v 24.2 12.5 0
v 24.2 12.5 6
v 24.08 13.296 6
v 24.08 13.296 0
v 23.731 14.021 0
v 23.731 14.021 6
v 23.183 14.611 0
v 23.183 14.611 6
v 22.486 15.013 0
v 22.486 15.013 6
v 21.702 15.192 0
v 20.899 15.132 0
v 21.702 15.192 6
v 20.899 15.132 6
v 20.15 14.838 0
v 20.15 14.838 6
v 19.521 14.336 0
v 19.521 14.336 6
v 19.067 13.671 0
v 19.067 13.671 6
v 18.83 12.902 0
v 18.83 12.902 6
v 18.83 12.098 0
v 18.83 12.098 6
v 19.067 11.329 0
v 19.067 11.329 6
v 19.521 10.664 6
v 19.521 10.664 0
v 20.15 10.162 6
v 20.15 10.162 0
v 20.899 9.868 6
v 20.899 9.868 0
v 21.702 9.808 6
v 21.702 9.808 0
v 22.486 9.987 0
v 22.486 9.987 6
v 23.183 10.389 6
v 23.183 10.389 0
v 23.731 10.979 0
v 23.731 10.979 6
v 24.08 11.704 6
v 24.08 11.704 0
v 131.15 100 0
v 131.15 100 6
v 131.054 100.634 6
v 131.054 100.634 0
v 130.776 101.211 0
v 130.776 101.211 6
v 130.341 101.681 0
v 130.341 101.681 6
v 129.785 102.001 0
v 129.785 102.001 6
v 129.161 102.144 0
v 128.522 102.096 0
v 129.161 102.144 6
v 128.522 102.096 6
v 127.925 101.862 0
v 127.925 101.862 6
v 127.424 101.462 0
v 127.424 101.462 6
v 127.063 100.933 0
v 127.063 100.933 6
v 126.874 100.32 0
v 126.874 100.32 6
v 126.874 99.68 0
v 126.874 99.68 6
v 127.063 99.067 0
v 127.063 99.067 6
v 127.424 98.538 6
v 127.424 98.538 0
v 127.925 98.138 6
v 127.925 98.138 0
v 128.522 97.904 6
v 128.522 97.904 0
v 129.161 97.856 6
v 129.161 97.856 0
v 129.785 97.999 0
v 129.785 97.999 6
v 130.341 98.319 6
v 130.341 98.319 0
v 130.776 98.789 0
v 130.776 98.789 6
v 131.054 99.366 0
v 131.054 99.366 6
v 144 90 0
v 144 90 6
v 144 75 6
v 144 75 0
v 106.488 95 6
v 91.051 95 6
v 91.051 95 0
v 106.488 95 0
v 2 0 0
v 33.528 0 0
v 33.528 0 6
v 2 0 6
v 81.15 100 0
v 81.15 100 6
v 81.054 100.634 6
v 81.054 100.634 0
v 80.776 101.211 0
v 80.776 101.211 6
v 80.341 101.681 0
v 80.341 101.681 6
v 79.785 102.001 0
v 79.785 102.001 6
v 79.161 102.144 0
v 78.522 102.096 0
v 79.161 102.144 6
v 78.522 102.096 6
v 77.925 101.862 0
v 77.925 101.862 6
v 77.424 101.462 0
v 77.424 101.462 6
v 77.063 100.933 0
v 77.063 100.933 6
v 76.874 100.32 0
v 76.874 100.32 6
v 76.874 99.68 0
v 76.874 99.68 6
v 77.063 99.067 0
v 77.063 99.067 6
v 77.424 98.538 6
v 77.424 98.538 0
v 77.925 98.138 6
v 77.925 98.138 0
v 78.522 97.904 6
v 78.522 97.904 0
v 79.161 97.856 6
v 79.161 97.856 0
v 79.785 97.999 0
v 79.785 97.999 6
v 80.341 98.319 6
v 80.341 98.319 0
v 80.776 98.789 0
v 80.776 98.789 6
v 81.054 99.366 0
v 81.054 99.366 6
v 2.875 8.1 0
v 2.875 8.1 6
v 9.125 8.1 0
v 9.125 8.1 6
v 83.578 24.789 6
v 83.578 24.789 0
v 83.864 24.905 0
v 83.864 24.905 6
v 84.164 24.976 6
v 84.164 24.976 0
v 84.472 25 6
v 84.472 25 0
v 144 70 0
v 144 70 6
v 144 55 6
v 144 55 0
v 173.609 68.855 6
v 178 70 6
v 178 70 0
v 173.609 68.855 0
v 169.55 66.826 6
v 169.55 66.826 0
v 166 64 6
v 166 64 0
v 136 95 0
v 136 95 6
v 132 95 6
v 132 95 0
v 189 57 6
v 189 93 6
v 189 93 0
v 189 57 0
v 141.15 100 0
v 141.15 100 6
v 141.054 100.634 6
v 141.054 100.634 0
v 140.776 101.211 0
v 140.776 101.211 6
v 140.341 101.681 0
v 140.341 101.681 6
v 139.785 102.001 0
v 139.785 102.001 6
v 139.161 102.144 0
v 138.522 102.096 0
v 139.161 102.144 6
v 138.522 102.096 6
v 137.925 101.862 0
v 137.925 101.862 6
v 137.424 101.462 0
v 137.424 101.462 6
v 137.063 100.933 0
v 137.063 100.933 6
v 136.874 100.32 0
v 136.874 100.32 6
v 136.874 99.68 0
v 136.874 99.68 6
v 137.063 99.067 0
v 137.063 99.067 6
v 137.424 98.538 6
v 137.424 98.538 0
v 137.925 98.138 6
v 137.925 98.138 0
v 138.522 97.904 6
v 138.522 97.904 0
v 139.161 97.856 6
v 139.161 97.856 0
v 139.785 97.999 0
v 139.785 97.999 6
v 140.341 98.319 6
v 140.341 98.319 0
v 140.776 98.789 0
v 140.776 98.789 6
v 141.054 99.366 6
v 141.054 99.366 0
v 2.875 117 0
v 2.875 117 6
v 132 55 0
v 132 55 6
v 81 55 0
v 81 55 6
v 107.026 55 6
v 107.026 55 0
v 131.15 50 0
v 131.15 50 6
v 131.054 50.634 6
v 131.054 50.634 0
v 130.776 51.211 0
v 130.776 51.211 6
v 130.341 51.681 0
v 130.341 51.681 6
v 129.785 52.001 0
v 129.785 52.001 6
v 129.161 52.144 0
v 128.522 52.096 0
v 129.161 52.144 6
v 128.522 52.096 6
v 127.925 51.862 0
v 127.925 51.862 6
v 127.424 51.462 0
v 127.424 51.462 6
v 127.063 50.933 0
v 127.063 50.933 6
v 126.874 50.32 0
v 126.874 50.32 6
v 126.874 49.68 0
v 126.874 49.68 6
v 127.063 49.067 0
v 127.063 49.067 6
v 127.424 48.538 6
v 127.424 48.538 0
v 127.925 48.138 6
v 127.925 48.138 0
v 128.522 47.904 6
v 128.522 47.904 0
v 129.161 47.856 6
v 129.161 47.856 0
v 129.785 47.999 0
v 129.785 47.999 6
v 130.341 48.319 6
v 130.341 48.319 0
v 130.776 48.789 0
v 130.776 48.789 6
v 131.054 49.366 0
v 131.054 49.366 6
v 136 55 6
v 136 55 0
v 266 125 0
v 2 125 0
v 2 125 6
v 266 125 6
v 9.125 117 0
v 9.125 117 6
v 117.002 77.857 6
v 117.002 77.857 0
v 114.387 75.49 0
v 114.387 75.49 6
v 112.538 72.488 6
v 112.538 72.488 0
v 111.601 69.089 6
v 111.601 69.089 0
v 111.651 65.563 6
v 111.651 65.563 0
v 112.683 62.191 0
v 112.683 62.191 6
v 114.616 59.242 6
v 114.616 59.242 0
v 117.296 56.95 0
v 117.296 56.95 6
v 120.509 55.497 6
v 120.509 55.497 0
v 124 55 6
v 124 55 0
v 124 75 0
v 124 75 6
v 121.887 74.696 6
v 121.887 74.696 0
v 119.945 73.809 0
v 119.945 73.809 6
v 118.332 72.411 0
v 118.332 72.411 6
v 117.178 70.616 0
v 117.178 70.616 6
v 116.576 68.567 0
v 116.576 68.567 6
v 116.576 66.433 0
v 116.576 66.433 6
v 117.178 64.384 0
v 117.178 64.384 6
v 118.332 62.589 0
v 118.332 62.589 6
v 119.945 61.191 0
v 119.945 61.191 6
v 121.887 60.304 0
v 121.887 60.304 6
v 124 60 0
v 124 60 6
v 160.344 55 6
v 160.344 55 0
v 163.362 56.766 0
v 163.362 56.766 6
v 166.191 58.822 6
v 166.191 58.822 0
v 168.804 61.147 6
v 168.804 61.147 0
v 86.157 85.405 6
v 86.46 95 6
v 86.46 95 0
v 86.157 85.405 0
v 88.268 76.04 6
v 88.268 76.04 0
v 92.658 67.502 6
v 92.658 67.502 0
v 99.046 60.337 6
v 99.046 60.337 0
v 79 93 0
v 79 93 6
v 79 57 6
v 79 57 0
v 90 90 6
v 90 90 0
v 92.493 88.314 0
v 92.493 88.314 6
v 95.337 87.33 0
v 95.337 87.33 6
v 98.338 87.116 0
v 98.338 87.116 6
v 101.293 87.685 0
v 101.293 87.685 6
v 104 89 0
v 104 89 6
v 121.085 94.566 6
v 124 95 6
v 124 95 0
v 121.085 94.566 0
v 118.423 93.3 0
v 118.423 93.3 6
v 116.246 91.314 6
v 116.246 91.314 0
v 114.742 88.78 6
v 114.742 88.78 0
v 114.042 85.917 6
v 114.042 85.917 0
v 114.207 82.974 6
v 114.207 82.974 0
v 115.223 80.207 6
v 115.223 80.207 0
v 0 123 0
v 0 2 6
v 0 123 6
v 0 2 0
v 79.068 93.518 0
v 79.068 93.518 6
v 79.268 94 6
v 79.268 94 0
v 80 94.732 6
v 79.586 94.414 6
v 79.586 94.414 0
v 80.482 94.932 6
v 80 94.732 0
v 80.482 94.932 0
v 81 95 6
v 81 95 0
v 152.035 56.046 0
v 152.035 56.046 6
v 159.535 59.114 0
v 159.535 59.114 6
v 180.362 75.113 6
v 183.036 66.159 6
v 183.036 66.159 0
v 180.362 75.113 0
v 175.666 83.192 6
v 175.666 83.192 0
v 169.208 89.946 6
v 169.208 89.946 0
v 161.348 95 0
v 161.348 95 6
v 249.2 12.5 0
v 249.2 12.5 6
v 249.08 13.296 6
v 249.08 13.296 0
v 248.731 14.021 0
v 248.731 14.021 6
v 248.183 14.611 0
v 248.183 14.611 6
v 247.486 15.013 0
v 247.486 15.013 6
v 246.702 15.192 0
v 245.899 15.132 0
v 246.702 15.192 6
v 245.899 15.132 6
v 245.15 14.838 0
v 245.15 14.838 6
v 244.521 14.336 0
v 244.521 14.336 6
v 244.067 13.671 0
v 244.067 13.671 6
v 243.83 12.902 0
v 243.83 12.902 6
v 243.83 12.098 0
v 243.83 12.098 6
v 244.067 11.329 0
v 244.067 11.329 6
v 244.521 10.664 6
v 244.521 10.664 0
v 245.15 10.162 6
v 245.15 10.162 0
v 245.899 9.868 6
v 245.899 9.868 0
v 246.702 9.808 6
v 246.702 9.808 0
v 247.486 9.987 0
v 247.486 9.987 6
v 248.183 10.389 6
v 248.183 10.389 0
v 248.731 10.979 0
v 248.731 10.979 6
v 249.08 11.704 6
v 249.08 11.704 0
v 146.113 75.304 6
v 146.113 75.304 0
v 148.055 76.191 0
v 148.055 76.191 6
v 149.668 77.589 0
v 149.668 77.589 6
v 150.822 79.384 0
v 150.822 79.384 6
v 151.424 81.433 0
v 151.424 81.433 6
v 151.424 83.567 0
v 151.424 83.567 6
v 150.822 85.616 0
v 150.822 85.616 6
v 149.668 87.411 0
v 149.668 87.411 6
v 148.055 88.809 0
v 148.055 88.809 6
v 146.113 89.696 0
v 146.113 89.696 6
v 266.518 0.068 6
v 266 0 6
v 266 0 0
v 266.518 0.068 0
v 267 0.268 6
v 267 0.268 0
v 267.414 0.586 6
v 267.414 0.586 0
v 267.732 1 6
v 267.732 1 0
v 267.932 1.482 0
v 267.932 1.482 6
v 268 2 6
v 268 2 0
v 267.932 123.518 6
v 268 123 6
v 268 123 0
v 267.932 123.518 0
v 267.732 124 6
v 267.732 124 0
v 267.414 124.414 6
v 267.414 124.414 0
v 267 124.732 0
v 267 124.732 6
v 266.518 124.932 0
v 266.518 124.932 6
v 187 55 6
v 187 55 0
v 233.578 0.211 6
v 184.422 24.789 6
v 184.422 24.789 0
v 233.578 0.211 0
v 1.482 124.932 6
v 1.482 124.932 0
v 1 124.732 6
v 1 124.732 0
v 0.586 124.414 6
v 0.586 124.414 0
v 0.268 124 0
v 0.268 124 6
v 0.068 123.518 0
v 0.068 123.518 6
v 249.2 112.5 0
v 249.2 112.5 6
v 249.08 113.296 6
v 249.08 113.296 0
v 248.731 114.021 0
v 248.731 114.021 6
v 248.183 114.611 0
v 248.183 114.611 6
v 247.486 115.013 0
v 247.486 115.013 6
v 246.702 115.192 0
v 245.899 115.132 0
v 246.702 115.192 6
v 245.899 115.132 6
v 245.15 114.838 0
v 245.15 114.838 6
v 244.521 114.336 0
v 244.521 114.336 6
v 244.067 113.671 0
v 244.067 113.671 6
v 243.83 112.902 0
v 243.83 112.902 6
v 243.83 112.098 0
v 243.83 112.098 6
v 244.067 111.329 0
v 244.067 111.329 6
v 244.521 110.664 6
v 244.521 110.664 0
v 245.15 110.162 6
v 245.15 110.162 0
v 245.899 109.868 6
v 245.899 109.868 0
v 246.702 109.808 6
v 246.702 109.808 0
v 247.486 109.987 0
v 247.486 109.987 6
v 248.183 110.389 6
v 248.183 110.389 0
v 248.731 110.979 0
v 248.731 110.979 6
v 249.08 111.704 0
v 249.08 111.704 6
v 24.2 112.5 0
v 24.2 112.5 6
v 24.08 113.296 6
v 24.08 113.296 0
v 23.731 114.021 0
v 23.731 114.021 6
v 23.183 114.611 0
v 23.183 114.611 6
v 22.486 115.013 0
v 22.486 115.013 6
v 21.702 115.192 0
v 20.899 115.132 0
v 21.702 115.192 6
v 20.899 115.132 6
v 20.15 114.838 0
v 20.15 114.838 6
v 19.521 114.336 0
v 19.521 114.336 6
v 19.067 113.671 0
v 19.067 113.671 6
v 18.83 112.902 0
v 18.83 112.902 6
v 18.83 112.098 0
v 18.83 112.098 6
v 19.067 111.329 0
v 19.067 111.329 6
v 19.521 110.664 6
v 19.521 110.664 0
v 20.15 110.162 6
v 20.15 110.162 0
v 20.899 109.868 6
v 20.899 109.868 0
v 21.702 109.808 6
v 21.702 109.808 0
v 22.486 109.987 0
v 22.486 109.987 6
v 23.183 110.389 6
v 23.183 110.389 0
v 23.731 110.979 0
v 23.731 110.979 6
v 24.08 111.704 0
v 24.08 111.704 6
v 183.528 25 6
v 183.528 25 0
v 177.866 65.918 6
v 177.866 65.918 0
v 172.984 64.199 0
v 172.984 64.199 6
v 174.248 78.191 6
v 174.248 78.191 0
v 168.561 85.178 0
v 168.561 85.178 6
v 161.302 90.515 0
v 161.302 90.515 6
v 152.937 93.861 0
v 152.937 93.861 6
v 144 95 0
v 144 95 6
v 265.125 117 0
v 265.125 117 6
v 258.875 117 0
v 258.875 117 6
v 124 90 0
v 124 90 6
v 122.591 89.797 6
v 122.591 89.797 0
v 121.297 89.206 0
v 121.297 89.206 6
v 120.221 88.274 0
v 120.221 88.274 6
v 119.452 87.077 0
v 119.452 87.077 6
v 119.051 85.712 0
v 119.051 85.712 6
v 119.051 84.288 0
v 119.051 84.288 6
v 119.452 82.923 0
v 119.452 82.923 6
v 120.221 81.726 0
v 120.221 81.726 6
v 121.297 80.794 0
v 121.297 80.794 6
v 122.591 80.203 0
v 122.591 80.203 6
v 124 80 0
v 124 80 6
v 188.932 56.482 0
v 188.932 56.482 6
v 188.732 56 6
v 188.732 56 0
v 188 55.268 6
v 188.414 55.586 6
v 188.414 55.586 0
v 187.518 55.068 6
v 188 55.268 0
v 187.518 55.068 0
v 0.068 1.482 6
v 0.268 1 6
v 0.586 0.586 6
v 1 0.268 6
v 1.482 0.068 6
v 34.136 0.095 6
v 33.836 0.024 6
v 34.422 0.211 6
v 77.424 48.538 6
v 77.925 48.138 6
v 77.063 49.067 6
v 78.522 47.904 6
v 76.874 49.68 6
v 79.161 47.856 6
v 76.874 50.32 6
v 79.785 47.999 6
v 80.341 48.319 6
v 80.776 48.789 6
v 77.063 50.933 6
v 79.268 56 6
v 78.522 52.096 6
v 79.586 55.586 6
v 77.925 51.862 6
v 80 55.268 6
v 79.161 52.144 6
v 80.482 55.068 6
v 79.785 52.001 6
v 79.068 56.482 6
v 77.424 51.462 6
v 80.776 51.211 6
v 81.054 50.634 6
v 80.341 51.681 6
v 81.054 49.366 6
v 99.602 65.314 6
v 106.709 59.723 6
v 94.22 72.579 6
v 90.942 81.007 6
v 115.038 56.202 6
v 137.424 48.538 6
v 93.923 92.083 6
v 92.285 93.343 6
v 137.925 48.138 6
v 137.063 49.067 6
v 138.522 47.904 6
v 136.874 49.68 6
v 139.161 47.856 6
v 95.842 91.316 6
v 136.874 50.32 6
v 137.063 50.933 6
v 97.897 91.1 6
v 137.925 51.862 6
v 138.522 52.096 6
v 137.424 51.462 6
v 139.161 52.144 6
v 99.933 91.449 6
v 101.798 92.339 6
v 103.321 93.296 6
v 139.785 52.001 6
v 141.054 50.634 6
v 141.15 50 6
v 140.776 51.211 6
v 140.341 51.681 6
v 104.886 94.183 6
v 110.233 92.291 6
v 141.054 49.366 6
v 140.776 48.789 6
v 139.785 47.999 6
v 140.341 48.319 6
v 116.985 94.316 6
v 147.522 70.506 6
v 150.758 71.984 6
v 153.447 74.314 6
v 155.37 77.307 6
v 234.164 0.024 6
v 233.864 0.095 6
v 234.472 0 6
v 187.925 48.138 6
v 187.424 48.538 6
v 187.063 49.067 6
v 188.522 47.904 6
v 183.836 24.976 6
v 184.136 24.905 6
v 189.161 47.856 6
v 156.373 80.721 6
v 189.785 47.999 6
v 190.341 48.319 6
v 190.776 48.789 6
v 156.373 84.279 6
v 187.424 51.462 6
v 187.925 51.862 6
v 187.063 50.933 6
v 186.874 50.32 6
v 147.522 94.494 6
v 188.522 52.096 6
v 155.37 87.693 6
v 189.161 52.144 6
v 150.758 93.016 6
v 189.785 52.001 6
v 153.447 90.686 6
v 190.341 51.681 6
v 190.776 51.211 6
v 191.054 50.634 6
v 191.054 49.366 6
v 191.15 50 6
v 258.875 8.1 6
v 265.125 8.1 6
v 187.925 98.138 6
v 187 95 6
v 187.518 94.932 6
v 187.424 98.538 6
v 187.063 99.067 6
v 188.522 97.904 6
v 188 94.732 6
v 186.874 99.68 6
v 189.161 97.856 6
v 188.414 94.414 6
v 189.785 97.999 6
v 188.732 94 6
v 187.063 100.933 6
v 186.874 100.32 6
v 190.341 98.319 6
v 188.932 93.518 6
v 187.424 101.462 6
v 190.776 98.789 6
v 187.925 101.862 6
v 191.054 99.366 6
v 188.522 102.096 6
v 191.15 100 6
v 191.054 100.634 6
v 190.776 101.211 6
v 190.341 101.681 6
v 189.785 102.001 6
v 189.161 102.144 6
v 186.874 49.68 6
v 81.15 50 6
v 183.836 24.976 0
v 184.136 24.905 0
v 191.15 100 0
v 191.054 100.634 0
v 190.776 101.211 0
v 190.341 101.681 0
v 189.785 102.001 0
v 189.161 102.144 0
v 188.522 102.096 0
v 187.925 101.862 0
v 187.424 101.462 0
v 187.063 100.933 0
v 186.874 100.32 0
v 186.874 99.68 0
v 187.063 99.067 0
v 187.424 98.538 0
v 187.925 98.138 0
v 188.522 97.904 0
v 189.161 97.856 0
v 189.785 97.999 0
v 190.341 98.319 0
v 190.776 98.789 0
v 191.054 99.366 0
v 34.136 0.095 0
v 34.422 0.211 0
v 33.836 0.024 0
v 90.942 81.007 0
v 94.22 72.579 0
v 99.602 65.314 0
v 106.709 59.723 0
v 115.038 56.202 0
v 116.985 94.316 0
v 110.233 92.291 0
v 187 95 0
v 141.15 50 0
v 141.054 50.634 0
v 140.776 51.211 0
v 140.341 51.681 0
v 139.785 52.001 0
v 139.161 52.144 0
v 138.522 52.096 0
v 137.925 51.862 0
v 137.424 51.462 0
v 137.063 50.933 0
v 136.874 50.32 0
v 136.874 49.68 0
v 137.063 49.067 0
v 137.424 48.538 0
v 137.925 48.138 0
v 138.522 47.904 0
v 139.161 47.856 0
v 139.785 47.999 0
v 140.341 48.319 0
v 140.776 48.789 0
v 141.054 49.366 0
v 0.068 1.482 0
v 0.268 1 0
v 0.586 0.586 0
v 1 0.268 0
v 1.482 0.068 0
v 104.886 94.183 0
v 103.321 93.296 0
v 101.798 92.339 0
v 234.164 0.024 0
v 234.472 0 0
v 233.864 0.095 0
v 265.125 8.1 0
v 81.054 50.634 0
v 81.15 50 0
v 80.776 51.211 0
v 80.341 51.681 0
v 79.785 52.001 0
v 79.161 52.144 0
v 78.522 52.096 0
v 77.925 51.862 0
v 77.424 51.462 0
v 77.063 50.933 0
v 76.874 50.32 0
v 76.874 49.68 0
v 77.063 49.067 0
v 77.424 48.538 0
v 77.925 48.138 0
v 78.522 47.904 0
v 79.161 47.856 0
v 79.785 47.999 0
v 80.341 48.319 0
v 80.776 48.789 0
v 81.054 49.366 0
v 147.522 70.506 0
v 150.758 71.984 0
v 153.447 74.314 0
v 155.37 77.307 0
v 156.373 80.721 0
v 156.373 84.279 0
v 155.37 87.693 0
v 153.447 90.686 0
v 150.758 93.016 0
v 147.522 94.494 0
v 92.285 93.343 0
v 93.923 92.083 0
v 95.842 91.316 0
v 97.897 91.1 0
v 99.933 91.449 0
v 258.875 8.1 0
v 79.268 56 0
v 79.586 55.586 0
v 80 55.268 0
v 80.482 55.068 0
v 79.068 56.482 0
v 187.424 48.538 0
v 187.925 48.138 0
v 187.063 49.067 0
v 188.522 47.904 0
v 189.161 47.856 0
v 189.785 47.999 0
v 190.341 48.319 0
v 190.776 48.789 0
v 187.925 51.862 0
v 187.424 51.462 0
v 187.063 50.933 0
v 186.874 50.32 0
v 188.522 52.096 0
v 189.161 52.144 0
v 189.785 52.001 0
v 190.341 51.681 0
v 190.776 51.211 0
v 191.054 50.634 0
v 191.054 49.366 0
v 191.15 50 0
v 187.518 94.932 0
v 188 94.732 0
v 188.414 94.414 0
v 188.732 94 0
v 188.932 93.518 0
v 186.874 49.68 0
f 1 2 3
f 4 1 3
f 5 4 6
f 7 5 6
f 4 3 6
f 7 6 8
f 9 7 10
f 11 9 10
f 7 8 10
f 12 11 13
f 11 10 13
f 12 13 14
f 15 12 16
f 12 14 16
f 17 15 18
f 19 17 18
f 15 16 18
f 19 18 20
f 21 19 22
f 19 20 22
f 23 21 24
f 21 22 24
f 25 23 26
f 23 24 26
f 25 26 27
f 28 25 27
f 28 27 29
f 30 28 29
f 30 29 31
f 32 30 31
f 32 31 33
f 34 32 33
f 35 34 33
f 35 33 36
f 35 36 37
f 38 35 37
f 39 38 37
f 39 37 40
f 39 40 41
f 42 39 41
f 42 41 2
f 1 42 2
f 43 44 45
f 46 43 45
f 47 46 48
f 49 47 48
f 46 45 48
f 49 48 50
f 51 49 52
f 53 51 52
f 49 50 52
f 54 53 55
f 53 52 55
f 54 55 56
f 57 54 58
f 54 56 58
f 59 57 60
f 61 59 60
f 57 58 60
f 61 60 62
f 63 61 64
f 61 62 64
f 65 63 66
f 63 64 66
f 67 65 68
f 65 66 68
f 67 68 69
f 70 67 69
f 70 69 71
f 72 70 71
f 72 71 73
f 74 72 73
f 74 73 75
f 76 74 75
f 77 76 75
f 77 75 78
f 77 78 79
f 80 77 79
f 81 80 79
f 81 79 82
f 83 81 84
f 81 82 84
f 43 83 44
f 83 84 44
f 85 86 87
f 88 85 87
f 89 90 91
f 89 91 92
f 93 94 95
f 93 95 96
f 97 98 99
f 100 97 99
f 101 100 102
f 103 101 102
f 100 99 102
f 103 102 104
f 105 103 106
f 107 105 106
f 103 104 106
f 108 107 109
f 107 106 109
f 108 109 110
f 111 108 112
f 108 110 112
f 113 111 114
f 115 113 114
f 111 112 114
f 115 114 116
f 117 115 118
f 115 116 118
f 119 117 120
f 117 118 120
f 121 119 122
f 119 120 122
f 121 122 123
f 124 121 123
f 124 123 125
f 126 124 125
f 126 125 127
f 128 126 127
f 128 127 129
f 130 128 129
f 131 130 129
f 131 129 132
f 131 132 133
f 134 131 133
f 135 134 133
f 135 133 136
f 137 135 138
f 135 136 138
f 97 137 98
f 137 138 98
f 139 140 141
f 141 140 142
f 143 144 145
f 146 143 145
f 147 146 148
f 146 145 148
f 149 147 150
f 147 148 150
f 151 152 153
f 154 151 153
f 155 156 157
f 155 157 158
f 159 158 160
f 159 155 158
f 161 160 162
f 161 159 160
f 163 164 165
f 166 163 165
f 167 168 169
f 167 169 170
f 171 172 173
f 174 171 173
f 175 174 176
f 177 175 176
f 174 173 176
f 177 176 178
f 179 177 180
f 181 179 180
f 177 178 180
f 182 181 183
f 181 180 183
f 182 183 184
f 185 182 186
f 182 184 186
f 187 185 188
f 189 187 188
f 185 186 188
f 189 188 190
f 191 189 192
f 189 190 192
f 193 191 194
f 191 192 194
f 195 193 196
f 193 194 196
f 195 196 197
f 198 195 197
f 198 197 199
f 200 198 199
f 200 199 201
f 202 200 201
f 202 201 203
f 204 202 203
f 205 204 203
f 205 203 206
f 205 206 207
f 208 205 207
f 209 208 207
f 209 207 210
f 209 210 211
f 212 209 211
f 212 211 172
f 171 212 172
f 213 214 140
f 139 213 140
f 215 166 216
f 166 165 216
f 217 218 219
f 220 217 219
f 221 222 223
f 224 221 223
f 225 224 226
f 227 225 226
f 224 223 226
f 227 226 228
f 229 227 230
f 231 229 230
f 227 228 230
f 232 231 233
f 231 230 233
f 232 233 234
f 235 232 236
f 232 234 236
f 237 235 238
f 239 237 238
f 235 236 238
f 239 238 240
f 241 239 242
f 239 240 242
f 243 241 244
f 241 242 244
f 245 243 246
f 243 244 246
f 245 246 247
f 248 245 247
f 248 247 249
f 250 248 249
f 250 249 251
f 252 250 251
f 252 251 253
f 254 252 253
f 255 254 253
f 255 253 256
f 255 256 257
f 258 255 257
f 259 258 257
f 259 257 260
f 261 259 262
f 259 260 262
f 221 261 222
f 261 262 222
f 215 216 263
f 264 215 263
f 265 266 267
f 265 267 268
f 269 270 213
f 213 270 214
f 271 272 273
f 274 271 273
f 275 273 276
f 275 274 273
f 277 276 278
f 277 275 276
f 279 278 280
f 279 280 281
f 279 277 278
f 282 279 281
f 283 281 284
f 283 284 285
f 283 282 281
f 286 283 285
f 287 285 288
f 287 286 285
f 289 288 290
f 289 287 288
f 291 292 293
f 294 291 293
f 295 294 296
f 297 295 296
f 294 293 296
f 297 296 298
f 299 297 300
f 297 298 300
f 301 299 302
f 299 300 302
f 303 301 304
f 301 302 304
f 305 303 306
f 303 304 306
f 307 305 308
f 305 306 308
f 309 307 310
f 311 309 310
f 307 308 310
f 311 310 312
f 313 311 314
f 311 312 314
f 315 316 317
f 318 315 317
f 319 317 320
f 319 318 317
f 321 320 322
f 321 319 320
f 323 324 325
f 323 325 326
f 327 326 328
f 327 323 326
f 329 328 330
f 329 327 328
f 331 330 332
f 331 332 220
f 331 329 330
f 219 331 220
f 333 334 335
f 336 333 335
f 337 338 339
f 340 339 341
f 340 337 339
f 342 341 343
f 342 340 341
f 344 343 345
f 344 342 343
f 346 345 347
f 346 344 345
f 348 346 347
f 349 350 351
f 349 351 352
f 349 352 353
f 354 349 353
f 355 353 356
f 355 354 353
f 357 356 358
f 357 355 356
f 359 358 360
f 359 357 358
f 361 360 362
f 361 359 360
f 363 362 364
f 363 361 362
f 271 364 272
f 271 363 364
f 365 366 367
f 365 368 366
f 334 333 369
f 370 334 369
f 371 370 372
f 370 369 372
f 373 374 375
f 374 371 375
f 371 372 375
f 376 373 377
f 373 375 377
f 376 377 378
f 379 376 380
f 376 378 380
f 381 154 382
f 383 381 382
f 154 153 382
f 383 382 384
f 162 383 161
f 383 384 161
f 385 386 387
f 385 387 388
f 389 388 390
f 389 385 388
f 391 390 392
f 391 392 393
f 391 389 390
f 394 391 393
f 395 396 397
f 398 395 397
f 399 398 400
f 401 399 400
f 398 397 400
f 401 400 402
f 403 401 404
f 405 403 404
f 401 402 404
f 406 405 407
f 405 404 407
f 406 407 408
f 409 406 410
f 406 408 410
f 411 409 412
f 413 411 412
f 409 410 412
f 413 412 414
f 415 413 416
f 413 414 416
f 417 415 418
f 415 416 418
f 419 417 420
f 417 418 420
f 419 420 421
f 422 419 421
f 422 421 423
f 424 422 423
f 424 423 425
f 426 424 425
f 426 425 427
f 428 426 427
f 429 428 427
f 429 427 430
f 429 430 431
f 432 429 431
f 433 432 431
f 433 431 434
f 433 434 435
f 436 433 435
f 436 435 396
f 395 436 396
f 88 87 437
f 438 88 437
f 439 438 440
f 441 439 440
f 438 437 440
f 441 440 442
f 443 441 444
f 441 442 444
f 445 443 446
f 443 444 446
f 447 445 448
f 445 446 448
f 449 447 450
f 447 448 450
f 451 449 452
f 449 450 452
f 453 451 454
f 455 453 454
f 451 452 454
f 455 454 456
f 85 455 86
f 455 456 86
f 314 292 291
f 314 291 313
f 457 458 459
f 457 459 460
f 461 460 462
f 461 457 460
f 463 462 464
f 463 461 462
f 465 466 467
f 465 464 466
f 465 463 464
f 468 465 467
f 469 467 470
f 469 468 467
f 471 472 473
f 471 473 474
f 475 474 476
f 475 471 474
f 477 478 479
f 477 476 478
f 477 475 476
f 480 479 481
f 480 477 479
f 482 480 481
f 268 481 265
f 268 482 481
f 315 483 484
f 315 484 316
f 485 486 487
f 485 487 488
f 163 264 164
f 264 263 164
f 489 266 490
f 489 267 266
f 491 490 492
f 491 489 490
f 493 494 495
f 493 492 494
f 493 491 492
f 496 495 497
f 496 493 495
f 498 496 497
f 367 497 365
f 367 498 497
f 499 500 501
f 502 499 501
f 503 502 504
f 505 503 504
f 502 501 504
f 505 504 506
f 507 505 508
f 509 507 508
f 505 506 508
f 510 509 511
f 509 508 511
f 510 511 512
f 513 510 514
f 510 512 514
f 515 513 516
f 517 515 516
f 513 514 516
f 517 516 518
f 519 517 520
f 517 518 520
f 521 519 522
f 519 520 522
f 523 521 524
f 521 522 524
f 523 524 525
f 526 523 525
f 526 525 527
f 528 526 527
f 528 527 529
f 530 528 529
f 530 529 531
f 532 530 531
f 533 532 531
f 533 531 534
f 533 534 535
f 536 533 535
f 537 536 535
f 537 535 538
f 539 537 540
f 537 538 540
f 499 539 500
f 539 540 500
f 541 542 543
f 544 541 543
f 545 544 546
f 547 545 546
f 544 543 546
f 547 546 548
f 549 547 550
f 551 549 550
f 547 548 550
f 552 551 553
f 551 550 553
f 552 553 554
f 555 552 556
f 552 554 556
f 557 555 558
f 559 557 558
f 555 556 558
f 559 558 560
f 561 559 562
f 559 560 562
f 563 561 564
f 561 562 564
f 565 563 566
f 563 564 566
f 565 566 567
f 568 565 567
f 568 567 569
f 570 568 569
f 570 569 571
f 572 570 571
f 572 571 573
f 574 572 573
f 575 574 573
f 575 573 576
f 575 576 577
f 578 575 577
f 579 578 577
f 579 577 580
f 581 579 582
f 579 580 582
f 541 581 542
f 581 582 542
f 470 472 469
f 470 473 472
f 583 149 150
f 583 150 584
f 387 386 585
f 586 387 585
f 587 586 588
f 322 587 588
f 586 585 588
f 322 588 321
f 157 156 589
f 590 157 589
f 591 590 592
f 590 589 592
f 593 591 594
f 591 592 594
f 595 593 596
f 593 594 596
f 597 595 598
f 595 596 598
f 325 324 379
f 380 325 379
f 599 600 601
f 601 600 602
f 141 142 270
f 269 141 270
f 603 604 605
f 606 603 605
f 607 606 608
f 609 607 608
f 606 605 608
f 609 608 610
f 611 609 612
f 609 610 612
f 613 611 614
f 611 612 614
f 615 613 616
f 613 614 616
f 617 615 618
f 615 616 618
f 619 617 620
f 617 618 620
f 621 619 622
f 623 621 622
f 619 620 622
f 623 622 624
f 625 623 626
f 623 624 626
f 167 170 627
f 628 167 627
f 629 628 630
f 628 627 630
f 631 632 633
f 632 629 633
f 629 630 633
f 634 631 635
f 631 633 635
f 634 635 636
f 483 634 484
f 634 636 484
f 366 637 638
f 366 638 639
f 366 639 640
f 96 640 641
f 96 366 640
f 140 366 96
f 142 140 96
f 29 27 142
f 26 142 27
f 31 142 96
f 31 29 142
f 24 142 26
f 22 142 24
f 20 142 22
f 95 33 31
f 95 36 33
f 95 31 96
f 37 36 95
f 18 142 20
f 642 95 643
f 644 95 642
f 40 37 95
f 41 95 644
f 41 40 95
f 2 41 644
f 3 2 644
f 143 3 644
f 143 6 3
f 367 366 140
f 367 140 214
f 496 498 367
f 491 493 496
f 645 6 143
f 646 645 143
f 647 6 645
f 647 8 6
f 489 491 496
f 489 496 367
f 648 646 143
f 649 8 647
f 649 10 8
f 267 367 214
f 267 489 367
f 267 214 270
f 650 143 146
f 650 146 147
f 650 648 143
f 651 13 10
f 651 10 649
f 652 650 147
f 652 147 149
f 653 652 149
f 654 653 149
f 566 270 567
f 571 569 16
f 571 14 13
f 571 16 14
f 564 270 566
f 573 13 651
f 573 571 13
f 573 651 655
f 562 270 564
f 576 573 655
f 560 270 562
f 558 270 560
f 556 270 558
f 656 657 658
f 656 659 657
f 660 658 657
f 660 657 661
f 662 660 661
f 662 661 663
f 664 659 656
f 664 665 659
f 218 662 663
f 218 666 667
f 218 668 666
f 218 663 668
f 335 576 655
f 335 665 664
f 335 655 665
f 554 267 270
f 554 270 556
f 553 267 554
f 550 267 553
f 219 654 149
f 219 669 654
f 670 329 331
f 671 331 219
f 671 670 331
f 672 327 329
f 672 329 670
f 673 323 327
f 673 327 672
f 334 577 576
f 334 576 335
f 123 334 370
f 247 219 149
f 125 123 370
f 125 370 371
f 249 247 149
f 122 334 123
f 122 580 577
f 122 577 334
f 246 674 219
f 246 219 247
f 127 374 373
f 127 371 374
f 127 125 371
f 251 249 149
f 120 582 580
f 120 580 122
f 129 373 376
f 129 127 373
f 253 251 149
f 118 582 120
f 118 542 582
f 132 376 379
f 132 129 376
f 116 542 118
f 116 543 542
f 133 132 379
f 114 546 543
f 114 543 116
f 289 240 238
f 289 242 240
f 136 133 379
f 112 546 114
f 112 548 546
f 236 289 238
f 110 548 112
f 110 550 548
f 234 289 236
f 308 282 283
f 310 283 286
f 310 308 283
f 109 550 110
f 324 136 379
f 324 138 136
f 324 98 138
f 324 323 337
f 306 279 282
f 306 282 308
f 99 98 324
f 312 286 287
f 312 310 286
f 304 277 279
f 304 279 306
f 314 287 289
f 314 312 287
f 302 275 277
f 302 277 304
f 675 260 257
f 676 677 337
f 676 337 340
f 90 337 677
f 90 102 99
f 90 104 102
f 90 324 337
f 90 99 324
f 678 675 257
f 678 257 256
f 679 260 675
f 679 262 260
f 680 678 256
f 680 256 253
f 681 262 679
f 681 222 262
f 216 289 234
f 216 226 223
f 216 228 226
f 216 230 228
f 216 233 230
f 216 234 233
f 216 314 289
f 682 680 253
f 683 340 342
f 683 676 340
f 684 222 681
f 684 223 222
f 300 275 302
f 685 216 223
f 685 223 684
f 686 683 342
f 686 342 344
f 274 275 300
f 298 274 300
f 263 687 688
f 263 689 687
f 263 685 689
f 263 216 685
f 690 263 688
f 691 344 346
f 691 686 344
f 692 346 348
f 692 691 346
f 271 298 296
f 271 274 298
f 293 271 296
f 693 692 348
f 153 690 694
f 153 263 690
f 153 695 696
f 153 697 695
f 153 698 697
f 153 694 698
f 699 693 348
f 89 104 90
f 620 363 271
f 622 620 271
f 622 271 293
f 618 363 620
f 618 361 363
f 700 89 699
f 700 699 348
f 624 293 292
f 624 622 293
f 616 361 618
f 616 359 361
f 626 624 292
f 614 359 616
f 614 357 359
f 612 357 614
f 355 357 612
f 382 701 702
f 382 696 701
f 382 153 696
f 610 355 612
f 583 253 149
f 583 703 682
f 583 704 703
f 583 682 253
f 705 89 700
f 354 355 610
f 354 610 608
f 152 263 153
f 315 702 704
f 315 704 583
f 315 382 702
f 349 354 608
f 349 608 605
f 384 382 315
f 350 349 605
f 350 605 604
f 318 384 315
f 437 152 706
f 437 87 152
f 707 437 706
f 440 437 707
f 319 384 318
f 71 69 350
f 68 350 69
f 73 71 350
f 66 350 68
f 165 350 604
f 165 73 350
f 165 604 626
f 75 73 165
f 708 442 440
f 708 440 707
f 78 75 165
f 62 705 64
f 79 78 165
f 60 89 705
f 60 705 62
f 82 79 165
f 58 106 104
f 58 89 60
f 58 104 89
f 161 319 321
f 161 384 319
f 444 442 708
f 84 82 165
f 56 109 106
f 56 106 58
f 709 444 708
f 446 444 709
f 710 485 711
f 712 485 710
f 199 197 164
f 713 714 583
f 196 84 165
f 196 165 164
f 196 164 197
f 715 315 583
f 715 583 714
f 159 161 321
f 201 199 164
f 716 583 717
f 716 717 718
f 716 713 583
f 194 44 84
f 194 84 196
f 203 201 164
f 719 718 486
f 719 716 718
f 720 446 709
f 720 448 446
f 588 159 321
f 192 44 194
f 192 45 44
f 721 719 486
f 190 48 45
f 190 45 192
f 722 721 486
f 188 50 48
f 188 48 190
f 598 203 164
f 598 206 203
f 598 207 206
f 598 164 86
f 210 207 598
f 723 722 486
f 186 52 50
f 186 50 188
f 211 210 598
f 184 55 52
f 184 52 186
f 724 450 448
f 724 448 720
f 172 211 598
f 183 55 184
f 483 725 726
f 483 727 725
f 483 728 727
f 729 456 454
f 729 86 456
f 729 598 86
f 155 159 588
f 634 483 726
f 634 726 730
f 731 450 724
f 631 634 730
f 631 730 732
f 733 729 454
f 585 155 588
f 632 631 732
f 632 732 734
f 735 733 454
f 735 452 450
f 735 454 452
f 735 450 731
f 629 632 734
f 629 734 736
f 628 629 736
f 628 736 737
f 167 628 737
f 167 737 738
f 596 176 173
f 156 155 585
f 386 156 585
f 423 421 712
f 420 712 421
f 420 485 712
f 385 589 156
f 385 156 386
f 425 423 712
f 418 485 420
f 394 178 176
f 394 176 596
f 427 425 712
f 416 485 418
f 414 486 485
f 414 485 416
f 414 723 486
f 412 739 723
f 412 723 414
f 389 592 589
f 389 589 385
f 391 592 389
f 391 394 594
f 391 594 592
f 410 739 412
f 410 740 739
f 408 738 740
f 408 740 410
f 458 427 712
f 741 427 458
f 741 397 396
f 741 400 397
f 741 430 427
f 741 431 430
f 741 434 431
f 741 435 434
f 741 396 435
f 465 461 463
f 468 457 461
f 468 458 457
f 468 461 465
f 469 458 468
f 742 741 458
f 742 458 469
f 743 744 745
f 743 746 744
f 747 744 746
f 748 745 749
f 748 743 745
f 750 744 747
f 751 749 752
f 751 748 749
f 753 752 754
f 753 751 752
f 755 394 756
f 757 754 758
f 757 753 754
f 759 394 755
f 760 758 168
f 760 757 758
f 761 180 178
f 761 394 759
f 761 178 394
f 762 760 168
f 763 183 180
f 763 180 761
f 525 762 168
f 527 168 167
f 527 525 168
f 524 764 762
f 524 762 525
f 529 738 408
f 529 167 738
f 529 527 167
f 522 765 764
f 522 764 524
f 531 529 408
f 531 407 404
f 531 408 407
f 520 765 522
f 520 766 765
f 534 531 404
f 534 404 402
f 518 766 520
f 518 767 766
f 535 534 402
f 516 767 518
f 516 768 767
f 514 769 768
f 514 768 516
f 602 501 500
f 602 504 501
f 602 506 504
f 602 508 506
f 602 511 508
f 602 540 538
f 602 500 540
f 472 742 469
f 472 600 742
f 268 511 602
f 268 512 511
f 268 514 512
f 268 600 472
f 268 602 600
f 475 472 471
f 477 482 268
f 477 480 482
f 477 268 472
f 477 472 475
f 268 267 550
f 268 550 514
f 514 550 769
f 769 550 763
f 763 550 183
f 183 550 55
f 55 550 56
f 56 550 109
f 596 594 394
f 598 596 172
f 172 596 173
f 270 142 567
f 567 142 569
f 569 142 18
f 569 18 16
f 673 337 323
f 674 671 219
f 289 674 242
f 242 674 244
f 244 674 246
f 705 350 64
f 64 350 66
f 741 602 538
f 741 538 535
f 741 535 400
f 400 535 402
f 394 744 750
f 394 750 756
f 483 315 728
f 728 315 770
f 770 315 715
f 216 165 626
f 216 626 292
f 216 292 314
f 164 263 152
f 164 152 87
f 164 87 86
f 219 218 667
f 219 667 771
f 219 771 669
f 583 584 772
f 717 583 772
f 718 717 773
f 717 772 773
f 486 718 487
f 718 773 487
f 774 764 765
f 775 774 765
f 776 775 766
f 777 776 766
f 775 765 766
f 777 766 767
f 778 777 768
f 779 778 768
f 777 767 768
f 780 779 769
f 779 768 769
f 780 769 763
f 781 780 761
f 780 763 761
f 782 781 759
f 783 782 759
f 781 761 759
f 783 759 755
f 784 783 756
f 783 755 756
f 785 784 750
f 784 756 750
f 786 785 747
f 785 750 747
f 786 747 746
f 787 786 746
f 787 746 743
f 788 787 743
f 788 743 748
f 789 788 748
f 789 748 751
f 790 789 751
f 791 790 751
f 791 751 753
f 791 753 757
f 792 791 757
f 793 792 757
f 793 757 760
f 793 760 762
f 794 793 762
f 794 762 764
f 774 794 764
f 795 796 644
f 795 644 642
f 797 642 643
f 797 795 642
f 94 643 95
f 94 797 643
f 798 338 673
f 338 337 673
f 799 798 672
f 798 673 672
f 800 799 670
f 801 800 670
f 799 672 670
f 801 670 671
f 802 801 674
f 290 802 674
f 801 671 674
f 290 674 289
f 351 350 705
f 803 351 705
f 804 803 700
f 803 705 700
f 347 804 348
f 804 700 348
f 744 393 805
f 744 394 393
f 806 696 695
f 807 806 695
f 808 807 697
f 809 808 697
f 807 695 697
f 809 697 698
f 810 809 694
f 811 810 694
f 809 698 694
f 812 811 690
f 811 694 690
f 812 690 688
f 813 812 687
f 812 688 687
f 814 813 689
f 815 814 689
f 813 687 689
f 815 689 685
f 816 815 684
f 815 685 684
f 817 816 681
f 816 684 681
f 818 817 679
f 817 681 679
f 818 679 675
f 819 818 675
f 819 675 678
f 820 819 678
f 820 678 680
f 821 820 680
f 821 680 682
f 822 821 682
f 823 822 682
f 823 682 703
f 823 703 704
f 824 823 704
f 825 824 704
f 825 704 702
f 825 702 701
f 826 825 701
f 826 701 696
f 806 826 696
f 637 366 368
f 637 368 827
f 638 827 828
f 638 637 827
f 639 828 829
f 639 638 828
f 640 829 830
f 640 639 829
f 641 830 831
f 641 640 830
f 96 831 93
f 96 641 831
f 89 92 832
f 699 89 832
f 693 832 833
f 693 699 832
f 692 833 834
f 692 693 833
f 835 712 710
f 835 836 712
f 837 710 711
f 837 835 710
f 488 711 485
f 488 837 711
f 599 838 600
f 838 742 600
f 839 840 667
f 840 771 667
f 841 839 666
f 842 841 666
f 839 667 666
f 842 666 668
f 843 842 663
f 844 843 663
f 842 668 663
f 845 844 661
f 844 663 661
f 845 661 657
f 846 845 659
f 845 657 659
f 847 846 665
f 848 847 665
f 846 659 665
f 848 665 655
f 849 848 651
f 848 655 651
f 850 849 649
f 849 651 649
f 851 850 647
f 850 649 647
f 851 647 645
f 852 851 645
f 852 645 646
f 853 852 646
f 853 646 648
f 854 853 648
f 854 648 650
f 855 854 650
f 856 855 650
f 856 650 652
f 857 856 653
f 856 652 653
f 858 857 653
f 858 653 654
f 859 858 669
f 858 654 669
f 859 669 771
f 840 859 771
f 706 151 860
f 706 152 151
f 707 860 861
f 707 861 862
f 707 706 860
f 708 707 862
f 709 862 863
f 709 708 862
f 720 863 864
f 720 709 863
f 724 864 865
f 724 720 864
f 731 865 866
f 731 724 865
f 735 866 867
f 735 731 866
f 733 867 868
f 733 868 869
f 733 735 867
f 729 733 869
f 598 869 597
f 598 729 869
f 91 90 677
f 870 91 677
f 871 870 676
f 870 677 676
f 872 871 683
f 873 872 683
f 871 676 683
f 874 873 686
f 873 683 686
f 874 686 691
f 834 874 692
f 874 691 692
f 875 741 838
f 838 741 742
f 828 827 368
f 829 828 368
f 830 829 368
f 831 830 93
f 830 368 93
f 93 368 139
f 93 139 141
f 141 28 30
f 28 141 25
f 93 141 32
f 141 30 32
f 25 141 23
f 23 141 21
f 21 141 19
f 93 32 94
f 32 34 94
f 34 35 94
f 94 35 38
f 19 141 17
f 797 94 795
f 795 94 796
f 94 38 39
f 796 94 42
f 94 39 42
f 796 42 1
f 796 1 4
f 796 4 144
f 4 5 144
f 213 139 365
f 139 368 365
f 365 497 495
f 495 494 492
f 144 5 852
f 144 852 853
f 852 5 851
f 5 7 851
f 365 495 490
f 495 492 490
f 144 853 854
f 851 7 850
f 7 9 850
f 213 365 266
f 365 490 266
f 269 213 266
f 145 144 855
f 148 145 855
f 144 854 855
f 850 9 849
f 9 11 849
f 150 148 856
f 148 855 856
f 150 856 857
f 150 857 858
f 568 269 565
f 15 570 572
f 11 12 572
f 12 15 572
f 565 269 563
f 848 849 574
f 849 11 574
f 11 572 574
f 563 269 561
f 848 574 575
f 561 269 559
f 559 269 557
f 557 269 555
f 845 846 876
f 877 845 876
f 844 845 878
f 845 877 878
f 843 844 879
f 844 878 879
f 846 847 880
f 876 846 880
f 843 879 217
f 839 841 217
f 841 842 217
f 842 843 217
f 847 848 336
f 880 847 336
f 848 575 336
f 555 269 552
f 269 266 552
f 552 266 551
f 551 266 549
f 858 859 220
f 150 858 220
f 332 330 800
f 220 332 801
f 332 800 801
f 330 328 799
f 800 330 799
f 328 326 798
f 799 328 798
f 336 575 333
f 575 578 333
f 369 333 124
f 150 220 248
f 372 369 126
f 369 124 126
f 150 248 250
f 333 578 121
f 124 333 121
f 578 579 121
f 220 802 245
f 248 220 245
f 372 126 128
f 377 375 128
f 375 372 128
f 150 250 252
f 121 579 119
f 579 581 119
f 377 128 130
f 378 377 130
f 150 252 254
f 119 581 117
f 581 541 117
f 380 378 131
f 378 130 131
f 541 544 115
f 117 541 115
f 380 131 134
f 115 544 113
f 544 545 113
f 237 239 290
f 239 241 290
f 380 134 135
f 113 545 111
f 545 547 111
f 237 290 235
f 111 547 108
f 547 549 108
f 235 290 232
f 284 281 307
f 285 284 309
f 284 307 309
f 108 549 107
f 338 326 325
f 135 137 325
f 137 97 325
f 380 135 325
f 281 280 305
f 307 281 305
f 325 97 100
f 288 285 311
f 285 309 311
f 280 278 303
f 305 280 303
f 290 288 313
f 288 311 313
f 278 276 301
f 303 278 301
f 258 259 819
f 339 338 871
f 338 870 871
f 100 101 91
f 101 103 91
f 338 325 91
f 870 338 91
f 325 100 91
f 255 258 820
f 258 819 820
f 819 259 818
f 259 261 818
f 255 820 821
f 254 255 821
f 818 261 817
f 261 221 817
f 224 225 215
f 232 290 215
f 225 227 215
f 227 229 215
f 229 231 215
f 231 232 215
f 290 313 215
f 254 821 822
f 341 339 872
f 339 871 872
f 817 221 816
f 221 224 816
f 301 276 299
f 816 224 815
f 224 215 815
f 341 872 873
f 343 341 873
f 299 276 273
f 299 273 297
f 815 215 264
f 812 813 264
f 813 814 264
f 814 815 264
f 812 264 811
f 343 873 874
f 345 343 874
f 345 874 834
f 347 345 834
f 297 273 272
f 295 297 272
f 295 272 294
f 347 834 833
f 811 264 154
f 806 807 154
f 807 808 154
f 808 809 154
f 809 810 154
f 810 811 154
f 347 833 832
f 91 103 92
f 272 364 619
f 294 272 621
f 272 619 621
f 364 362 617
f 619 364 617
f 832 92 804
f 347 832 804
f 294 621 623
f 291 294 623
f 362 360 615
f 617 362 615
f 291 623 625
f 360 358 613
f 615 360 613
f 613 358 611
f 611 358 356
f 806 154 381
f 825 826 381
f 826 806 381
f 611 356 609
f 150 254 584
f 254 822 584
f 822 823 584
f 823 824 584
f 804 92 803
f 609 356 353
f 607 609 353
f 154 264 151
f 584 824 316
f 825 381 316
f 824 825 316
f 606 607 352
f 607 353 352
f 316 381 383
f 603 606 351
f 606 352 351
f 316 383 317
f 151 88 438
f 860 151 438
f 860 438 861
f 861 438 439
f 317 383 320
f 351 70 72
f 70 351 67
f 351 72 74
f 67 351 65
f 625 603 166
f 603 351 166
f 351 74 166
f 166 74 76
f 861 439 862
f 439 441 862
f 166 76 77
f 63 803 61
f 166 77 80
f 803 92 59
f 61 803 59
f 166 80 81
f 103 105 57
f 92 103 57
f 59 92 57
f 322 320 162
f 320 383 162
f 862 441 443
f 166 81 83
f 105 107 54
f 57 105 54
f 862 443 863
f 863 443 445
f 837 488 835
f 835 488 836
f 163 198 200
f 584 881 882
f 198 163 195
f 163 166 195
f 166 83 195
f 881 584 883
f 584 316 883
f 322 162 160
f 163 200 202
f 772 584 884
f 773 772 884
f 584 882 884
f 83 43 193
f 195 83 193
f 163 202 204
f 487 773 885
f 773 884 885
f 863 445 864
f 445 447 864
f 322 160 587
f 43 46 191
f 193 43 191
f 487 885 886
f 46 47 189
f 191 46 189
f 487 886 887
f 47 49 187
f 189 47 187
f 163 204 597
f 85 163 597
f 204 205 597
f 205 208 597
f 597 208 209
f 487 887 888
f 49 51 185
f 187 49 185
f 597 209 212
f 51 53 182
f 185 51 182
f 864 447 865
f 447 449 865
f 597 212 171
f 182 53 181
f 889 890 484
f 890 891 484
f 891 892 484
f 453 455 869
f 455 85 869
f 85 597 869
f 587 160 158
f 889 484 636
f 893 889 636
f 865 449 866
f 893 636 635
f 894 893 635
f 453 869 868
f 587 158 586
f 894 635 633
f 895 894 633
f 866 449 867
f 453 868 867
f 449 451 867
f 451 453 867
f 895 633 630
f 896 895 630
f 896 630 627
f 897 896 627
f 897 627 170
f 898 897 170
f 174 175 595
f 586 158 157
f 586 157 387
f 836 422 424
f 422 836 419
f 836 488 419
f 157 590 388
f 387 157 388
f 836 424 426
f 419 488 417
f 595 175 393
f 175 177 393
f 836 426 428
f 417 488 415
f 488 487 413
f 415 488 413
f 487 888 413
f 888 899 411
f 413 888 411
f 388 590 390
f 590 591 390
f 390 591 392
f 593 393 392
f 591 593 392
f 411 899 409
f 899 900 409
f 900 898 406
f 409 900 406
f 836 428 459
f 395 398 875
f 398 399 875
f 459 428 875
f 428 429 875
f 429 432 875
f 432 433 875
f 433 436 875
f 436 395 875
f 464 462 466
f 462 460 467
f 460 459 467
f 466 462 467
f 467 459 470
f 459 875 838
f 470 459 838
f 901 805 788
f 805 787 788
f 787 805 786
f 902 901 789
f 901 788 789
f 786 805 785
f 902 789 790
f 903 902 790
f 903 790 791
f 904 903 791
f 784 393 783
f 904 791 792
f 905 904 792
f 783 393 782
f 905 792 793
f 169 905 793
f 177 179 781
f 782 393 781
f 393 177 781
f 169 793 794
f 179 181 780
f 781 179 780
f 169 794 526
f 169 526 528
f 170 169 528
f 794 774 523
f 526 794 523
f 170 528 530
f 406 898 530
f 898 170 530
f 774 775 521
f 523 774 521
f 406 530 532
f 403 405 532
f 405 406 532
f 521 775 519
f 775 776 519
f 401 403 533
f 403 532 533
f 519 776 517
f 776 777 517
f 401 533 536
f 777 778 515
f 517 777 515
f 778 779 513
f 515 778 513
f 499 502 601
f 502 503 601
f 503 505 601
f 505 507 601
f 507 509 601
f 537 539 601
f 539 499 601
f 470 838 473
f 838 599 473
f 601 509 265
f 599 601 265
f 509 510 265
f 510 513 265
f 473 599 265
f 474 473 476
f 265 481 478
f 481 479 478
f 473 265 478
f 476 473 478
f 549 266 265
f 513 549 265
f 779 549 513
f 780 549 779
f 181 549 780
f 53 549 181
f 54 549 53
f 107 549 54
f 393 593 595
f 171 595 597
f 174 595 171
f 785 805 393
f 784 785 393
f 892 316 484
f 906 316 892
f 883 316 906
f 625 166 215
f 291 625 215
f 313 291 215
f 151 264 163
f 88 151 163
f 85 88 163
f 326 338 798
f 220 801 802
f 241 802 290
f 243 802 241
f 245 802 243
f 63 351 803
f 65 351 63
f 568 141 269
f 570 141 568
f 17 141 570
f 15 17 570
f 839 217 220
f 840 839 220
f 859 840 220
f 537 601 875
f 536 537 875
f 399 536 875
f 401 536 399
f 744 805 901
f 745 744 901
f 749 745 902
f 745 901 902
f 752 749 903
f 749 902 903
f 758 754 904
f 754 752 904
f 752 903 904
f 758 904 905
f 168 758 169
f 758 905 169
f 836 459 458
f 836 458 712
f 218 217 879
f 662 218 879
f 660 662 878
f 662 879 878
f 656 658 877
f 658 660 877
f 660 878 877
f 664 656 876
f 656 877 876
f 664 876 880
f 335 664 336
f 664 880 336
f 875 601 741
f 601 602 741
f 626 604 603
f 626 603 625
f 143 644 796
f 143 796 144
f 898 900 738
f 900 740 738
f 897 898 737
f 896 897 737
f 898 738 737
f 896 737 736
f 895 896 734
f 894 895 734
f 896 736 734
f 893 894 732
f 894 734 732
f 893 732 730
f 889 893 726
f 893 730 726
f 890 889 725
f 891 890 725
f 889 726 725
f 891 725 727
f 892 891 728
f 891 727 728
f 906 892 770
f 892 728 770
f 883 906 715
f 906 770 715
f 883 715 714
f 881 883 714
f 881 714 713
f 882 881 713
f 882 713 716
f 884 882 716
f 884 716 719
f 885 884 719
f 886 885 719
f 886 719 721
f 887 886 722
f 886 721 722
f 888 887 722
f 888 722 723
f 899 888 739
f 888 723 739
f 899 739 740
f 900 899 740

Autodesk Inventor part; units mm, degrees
ref_plane "YZ Plane" through (0, 0, 0) normal (1, 0, 0) x (0, 1, 0)
ref_plane "XZ Plane" through (0, 0, 0) normal (0, 1, 0) x (-1, 0, 0)
ref_plane "XY Plane" through (0, 0, 0) normal (0, 0, 1) x (1, 0, 0)
sketch "Sketch1" plane through (0, 0, 0) normal (0, 0, 1) x (1, 0, 0)
  line L0 (0, 0) -> (0, 125)
  line L1 (0, 125) -> (268, 125)
  line L2 (268, 125) -> (268, 0)
  line L3 (268, 0) -> (0, 0)
  point P0 (134, 125)
  dimension "d1" = 125
  dimension "d2" = 268
extrude "Extrusion1" add sketch "Sketch1" along normal blind 6
sketch "Sketch2" plane through (0, 0, 6) normal (0, 0, 1) x (1, 0, 0)
  line L0 (0, 0) -> (268, 0) projected
  line L1 (268, 0) -> (268, 125) projected
  line L2 (34, 0) -> (84, 25)
  line L3 (84, 25) -> (184, 25)
  line L4 (184, 25) -> (234, 0)
  line L5 (234, 0) -> (34, 0)
  line L6 (0, 125) -> (0, 0) projected
  dimension "d6" = 25
  dimension "d7" = 34
  dimension "d9" = 50
  dimension "d47" = 34
extrude "Extrusion2" cut sketch "Sketch2" against normal through all
sketch "Sketch7" plane through (0, 0, 6) normal (0, 0, 1) x (1, 0, 0)
  line L0 (268, 0) -> (268, 125) projected
  line L1 (268, 125) -> (0, 125) projected
  line L2 (0, 125) -> (0, 0) projected
  line L3 (0, 0) -> (34, 0) projected
  circle A0 centre (246.5, 12.5) radius 2.7
  circle A1 centre (246.5, 112.5) radius 2.7
  circle A2 centre (21.5, 12.5) radius 2.7
  circle A3 centre (21.5, 112.5) radius 2.7
  line L4 (2.875, 8.1) -> (9.125, 8.1)
  line L5 (9.125, 8.1) -> (9.125, 117)
  line L6 (9.125, 117) -> (2.875, 117)
  line L7 (2.875, 117) -> (2.875, 8.1)
  line L8 (2.875, 8.1) -> (9.125, 117) construction
  line L9 (9.125, 8.1) -> (2.875, 117) construction
  line L10 (258.875, 8.1) -> (265.125, 8.1)
  line L11 (265.125, 8.1) -> (265.125, 117)
  line L12 (265.125, 117) -> (258.875, 117)
  line L13 (258.875, 117) -> (258.875, 8.1)
  line L14 (258.875, 8.1) -> (265.125, 117) construction
  line L15 (265.125, 8.1) -> (258.875, 117) construction
  point P0 (6, 62.55)
  point P1 (262, 62.55)
  point P2 (6, 62.55)
  point P3 (262, 62.55)
  dimension "d48" = 21.5
  dimension "d49" = 21.5
  dimension "d50" = 12.5
  dimension "d51" = 12.5
  dimension "d56" = 2.875
  dimension "d57" = 6.25
  dimension "d58" = 2.875
  dimension "d60" = 8
  dimension "d61" = 5.4
  dimension "d62" = 108.9
  dimension "d66" = 8.1
extrude "Extrusion5" cut sketch "Sketch7" against normal through all
fillet "Fillet1" radius 2 8 edges at (268, 125, 3) (268, 0, 3) (234, 0, 3) (184, 25, 3) (84, 25, 3) (34, 0, 3) (0, 0, 3) (0, 125, 3)
sketch "Sketch8" plane through (0, 0, 6) normal (0, 0, 1) x (1, 0, 0)
  line L0 (9.125, 8.1) -> (2.875, 8.1) projected
  line L1 (84.4721, 25) -> (183.5279, 25) projected
  line L2 (266, 125) -> (2, 125) projected
  line L3 (79, 50) -> (129, 50) construction
  line L4 (129, 50) -> (129, 100) construction
  line L5 (129, 100) -> (79, 100) construction
  line L6 (79, 100) -> (79, 50) construction
  line L7 (79, 50) -> (129, 100) construction
  line L8 (129, 50) -> (79, 100) construction
  line L9 (139, 50) -> (189, 50) construction
  line L10 (189, 50) -> (189, 100) construction
  line L11 (189, 100) -> (139, 100) construction
  line L12 (139, 100) -> (139, 50) construction
  line L13 (139, 50) -> (189, 100) construction
  line L14 (189, 50) -> (139, 100) construction
  line L15 (104, 75) -> (164, 75) construction
  line L16 (134, 75) -> (134, 25) construction
  circle A0 centre (79, 100) radius 2.15
  circle A1 centre (129, 100) radius 2.15
  circle A2 centre (139, 100) radius 2.15
  circle A3 centre (189, 100) radius 2.15
  circle A4 centre (189, 50) radius 2.15
  circle A5 centre (139, 50) radius 2.15
  circle A6 centre (129, 50) radius 2.15
  circle A7 centre (79, 50) radius 2.15
  point P0 (0, 0)
  dimension "d67" = 50
  dimension "d68" = 60
  dimension "d69" = 100
  dimension "d70" = 25
  dimension "d71" = 4.3
extrude "Extrusion6" cut sketch "Sketch8" against normal blind 10
sketch "Sketch9" plane through (0, 0, 6) normal (0, 0, 1) x (1, 0, 0)
  circle A0 centre (79, 100) radius 2.15 projected
  circle A1 centre (79, 50) radius 2.15 projected
  line L0 (9.125, 117) -> (9.125, 8.1) projected
  line L1 (9.125, 8.1) -> (2.875, 8.1) projected
  line L2 (84.4721, 25) -> (183.5279, 25) projected
  line L3 (132, 55) -> (136, 55)
  line L4 (136, 55) -> (136, 95)
  line L5 (136, 95) -> (132, 95)
  line L6 (132, 95) -> (132, 55)
  line L7 (132, 55) -> (136, 95) construction
  line L8 (136, 55) -> (132, 95) construction
  line L9 (134, 25) -> (134, 75) construction
  line L10 (144, 90) -> (144, 75)
  arc A2 (144, 75) -> (144, 90) centre (144, 82.5) ccw
  arc A3 (144, 70) -> (144, 95) centre (144, 82.5) ccw
  line L11 (144, 70) -> (144, 55)
  arc A4 (178, 70) -> (144, 95) centre (144, 59.38) ccw
  arc A5 (178, 70) -> (166, 64) centre (181.2699, 48.4602) ccw
  arc A6 (144, 55) -> (166, 64) centre (144, 86.3889) ccw
  line L12 (144, 95) -> (136, 95) construction
  line L13 (136, 55) -> (144, 55) construction
  line L14 (161.3482, 95) -> (189, 95)
  line L15 (189, 95) -> (189, 55)
  line L16 (189, 55) -> (160.3435, 55)
  arc A7 (183.0358, 66.1589) -> (161.3482, 95) centre (144, 59.38) ccw
  arc A8 (160.3435, 55) -> (168.8035, 61.1469) centre (144, 86.3889) ccw
  arc A9 (183.0358, 66.1589) -> (168.8035, 61.1469) centre (181.2699, 48.4602) ccw
  line L17 (124, 75) -> (124, 60)
  line L18 (124, 90) -> (124, 80)
  arc A10 (124, 90) -> (124, 80) centre (124, 85) ccw
  arc A11 (124, 75) -> (124, 60) centre (124, 67.5) ccw
  arc A12 (117.0015, 77.8571) -> (124, 55) centre (124, 67.5) ccw
  arc A13 (124, 95) -> (117.0015, 77.8571) centre (124, 85) ccw
  line L19 (132, 95) -> (124, 95) construction
  line L20 (132, 55) -> (124, 55) construction
  arc A14 (124, 95) -> (104, 89) centre (124, 58.6667) ccw
  arc A15 (90, 90) -> (104, 89) centre (97.652, 98.6278) ccw
  arc A16 (90, 90) -> (124, 55) centre (124, 89.0143) ccw
  line L21 (86.4599, 95) -> (79, 95)
  line L22 (79, 95) -> (79, 55)
  line L23 (79, 55) -> (107.0261, 55)
  arc A17 (86.4599, 95) -> (107.0261, 55) centre (124, 89.0143) ccw
  arc A18 (91.051, 95) -> (101.7982, 92.3394) centre (97.652, 98.6278) ccw
  arc A19 (106.4881, 95) -> (101.7982, 92.3394) centre (124, 58.6667) ccw
  line L24 (91.051, 95) -> (106.4881, 95)
  point P0 (0, 0)
  point P1 (140, 55)
  dimension "d74" = 4
  dimension "d75" = 40
  dimension "d76" = 50
  dimension "d77" = 25
  dimension "d78" = 12.5
  dimension "d79" = 5
  dimension "d80" = 8
  dimension "d81" = 22
  dimension "d82" = 15
  dimension "d83" = 34
  dimension "d84" = 9
  dimension "d85" = 4
  dimension "d86" = 4
  dimension "d87" = 55
  dimension "d88" = 8
  dimension "d89" = 5
  dimension "d90" = 10
  dimension "d91" = 5
  dimension "d92" = 34
  dimension "d93" = 35
  dimension "d94" = 20
  dimension "d95" = 6
  dimension "d96" = 55
  dimension "d97" = 4
  dimension "d99" = 4
extrude "Extrusion7" cut sketch "Sketch9" against normal blind 10 contours L6 L5 L4 L3 | A2 L10 | A3 A4 A5 A6 L11 | L14 L15 L16 A8 A9 A7 | L17 A11 | L18 A10 | A12 A16 A15 A14 A13 | A17 L23 L22 L21 | L24 A19 A18
fillet "Fillet2" radius 2 4 edges at (79, 95, 3) (79, 55, 3) (189, 55, 3) (189, 95, 3)
equation "\"d7\" = d47"
equation "\"d49\" = d48"
equation "\"d51\" = d50"
equation "\"d58\" = d56"
equation "\"d70\" = -0.5 * d67 + 0.5 * d69"
equation "\"d77\" = 0.5 * d76"
equation "\"d86\" = d85"
equation "\"d89\" = d79"
equation "\"d91\" = d79"
equation "\"d97\" = d85"
properties part number "FrontPanel"
